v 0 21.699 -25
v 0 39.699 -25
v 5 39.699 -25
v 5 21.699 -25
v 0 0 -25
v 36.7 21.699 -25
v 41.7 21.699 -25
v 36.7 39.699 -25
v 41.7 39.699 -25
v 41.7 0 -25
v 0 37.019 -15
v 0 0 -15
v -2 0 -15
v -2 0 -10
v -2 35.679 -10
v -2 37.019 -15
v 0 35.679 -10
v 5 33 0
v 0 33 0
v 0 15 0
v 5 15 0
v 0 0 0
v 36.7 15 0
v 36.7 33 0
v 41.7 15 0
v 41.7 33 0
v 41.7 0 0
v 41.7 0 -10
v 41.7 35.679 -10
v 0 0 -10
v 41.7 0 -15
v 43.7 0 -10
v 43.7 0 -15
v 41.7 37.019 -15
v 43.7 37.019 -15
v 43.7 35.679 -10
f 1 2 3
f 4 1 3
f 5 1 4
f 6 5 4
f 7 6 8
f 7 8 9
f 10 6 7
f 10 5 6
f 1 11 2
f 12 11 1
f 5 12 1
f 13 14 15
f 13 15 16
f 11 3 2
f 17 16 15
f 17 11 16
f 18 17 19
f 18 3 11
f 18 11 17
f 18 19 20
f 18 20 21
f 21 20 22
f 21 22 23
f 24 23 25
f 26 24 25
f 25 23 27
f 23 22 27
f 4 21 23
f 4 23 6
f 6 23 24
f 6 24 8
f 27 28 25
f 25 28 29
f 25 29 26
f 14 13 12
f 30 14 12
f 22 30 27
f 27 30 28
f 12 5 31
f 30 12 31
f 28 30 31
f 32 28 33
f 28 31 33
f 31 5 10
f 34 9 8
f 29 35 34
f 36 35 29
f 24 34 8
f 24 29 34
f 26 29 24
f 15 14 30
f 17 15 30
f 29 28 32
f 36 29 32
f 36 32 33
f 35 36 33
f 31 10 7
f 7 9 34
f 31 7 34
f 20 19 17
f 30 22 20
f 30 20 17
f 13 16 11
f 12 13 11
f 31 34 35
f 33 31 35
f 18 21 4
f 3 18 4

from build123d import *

# Parameters (mm, degrees)
SKETCH_1_W      = 2
SKETCH_1_H      = 5
SKETCH_1_W_2    = 41.7
SKETCH_1_H_2    = 25
EXTRUDE_1_DEPTH = 15
EXTRUDE_2_DEPTH = 41.7
SKETCH_4_W      = 5
SKETCH_4_H      = 25.88190451
EXTRUDE_4_DEPTH = 18
EXTRUDE_3_REACH = 58.078
SKETCH_3_W      = 2
SKETCH_3_H      = 5


with BuildPart() as part:
    # 草圖1 → 填料-伸長1 (new body)
    with BuildSketch(Plane(origin=(0, 0, 0), x_dir=(1, 0, 0), z_dir=(0, 1, 0))):
        with Locations((-1, 12.5)):
            Rectangle(SKETCH_1_W, SKETCH_1_H)
        with Locations((20.85, 12.5)):
            Rectangle(SKETCH_1_W_2, SKETCH_1_H_2)
        with Locations((42.7, 12.5)):
            Rectangle(SKETCH_1_W, SKETCH_1_H)
    extrude(amount=EXTRUDE_1_DEPTH)

    # 草圖2 → 填料-伸長2 (add)
    with BuildSketch(Plane(origin=(41.7, 0, 0), x_dir=(0, 0, -1), z_dir=(1, 0, 0))):
        Polygon((0, 15), (25, 21.698729811), (25, 15), align=None)
    extrude(amount=-EXTRUDE_2_DEPTH)

    # 草圖4 → 填料-伸長4 (add, along a direction that is not the sketch's normal)
    with BuildSketch(Plane(origin=(0, 13.995190528, 3.75), x_dir=(1, 0, 0), z_dir=(0, 0.9659258262890681, 0.25881904510252157))):
        with Locations((2.5, 16.823237932)):
            Rectangle(SKETCH_4_W, SKETCH_4_H)
        with Locations((39.2, 16.823237932)):
            Rectangle(SKETCH_4_W, SKETCH_4_H)
    extrude(amount=EXTRUDE_4_DEPTH, dir=(0, 1, 0))

    # 填料-伸長3: up to this plane
    extrude_3_end = Plane(origin=(0, 31.995190528, 3.75), z_dir=(0, 0.9659258262890682, 0.2588190451025215))
    # 草圖3 → 填料-伸長3 (add, up to the surface)
    with BuildSketch(Plane(origin=(0, 15, 0), x_dir=(1, 0, 0), z_dir=(0, 1, 0)), mode=Mode.PRIVATE) as extrude_3_sk1:
        with Locations((42.7, 12.5)):
            Rectangle(SKETCH_3_W, SKETCH_3_H)
    extrude_3_tool1 = split(extrude(extrude_3_sk1.sketch, amount=EXTRUDE_3_REACH, mode=Mode.PRIVATE), bisect_by=extrude_3_end, keep=Keep.BOTH, mode=Mode.PRIVATE)
    add(extrude_3_tool1.solids().sort_by_distance((42.7, 15, -12.5))[0])
    # 草圖3 → 填料-伸長3 (add, up to the surface)
    with BuildSketch(Plane(origin=(0, 15, 0), x_dir=(1, 0, 0), z_dir=(0, 1, 0)), mode=Mode.PRIVATE) as extrude_3_sk2:
        with Locations((-1, 12.5)):
            Rectangle(SKETCH_3_W, SKETCH_3_H)
    extrude_3_tool2 = split(extrude(extrude_3_sk2.sketch, amount=EXTRUDE_3_REACH, mode=Mode.PRIVATE), bisect_by=extrude_3_end, keep=Keep.BOTH, mode=Mode.PRIVATE)
    add(extrude_3_tool2.solids().sort_by_distance((-1, 15, -12.5))[0])


solid = part.part
